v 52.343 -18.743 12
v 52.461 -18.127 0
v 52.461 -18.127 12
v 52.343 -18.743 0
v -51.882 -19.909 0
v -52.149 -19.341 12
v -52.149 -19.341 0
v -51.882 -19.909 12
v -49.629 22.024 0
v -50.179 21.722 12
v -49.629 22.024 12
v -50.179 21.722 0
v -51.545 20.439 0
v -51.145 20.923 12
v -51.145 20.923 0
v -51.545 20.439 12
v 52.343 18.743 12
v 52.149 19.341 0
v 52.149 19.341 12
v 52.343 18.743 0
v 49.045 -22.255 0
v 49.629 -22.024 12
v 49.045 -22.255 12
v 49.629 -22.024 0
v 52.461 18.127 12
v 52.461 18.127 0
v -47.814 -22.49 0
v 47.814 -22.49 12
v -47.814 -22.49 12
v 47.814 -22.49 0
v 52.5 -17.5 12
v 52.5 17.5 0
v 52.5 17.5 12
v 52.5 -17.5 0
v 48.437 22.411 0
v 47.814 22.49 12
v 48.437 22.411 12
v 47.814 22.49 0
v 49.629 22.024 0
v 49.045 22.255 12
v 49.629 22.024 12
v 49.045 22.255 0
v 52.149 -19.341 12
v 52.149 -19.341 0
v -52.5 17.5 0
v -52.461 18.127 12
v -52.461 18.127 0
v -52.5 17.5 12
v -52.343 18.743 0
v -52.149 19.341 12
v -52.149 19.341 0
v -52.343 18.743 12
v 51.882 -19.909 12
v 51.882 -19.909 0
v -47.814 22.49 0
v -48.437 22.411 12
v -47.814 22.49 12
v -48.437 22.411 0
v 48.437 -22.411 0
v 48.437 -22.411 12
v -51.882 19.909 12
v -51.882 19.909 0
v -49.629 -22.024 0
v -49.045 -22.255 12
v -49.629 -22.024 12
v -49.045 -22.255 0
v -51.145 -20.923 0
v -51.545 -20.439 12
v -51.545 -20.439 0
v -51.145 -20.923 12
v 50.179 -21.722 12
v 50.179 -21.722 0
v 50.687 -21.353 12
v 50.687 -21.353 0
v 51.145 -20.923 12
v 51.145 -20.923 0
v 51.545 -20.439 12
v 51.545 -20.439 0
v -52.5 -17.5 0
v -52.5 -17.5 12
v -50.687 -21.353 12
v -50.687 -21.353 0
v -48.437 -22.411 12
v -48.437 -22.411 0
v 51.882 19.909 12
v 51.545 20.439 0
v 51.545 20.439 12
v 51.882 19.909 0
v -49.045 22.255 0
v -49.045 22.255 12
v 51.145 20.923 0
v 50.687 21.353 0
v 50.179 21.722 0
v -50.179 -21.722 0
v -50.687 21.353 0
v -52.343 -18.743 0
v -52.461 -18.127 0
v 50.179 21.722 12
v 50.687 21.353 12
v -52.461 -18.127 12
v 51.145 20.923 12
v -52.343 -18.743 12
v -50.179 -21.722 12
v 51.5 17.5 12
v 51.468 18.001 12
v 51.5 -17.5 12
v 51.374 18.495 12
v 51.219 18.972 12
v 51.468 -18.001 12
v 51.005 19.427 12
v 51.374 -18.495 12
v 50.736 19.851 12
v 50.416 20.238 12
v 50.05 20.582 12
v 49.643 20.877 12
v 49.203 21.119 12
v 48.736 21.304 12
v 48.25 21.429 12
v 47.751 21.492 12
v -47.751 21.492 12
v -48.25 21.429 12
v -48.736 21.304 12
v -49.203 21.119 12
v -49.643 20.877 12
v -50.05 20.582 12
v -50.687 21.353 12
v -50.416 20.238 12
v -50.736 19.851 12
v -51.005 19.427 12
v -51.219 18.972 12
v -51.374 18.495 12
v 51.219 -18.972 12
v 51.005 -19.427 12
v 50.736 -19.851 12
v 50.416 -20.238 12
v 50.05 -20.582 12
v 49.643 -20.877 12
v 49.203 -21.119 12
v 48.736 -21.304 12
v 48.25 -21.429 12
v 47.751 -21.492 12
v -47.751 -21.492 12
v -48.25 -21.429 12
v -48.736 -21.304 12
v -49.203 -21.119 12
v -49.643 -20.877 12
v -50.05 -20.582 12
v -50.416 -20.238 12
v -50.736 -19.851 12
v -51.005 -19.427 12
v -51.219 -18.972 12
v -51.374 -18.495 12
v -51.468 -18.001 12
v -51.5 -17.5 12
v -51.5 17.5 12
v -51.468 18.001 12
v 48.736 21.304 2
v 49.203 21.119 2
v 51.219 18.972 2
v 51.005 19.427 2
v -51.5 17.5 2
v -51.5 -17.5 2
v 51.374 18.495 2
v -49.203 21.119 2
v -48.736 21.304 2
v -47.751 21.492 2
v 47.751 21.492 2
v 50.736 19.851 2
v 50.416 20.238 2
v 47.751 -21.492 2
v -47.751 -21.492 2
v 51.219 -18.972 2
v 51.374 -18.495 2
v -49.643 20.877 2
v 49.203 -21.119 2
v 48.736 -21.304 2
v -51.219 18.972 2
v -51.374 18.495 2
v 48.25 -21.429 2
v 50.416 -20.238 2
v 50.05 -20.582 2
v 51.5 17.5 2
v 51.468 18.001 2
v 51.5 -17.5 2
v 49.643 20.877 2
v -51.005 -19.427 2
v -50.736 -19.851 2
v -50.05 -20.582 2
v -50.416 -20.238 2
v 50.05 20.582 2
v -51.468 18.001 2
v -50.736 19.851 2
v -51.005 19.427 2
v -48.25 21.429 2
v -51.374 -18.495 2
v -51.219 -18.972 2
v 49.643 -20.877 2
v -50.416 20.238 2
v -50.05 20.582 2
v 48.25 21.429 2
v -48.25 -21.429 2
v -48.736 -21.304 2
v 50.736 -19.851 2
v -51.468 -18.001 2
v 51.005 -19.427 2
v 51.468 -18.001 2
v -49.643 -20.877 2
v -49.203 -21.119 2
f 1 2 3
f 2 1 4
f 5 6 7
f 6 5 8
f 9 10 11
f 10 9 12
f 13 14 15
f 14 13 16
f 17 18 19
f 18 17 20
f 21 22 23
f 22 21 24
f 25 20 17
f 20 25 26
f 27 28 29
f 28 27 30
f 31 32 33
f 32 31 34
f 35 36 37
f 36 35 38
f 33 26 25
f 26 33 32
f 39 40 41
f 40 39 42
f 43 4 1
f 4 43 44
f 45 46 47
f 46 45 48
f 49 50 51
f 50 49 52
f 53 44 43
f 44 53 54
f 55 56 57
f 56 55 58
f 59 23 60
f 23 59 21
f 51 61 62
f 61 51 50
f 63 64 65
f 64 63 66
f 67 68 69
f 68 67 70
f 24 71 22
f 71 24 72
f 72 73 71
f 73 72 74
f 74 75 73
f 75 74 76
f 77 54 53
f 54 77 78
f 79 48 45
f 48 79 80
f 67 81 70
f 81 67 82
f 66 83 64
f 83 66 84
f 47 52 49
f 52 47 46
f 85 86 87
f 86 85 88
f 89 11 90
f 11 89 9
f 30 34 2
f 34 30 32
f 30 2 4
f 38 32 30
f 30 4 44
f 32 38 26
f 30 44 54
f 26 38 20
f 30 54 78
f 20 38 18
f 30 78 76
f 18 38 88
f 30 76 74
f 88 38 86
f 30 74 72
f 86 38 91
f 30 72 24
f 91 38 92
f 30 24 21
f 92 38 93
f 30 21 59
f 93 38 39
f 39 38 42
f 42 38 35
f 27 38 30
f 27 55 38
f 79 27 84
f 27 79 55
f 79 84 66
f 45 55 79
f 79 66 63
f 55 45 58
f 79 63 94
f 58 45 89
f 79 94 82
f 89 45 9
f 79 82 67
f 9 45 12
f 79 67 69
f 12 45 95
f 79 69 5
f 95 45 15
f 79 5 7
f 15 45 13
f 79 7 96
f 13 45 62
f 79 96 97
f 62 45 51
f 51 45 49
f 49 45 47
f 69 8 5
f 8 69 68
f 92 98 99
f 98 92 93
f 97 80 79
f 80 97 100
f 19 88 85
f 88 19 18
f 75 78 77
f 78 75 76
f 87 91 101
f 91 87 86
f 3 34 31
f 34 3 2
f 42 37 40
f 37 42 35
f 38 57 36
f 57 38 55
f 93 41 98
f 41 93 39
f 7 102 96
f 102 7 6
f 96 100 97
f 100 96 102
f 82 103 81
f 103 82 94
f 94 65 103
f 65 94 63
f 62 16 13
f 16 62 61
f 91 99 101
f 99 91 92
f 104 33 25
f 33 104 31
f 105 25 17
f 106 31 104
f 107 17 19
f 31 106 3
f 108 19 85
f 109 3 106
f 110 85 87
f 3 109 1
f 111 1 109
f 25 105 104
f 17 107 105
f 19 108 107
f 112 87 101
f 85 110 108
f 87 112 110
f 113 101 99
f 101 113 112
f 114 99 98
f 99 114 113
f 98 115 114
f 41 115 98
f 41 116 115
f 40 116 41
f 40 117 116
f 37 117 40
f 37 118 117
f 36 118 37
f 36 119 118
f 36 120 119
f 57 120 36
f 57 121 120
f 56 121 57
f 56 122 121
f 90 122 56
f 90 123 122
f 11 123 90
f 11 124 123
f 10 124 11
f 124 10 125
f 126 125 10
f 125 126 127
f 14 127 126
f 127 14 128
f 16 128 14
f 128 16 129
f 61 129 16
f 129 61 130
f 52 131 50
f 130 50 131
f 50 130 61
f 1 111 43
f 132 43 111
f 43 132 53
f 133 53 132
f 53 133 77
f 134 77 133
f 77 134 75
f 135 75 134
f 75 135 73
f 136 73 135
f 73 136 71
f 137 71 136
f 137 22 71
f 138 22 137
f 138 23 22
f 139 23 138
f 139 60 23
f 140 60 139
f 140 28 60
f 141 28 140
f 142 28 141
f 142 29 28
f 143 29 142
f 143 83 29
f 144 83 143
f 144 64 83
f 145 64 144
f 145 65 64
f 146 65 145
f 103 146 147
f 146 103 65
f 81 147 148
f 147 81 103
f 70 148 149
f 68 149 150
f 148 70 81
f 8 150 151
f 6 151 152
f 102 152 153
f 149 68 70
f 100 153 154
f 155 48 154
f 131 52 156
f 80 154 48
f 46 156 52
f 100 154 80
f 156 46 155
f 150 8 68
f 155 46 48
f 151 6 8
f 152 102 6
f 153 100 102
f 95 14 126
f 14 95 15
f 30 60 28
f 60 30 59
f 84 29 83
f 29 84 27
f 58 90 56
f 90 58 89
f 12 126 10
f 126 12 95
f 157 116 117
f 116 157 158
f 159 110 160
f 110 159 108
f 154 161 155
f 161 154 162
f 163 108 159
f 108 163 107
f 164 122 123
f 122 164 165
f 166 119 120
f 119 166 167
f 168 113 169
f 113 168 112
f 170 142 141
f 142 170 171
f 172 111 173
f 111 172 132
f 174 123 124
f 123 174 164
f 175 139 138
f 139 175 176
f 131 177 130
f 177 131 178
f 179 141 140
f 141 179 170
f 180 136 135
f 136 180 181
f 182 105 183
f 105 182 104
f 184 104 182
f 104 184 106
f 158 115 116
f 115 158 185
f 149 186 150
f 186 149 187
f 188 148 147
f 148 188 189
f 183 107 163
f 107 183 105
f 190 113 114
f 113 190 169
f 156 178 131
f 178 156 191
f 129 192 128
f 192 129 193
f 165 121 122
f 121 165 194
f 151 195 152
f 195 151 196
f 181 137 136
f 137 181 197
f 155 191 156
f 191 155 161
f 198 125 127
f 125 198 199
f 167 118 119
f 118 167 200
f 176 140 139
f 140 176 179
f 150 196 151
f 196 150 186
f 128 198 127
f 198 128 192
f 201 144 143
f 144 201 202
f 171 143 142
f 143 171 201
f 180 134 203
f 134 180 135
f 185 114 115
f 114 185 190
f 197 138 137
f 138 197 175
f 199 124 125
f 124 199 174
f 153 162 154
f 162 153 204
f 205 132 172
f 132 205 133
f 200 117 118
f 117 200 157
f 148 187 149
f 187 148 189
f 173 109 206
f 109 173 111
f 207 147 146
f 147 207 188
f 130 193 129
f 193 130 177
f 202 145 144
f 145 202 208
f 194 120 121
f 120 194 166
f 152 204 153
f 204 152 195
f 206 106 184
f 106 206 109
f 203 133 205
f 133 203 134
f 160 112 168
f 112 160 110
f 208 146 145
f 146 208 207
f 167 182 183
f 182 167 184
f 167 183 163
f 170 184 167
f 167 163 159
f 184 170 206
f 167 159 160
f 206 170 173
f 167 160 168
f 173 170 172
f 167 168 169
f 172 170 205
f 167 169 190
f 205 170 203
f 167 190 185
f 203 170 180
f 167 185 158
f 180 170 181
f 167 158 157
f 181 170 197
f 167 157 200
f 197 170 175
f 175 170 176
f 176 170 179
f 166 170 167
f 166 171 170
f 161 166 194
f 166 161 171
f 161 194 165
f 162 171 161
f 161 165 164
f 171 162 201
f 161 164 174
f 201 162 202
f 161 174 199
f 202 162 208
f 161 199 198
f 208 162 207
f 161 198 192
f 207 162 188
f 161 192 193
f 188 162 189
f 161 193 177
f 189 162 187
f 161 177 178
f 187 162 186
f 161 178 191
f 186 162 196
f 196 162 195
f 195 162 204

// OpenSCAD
$fn = 50;


difference() {
	union() {
		hull() {
			translate(v = [-47.5000000000, 17.5000000000, 0]) {
				cylinder(h = 12, r = 5);
			}
			translate(v = [47.5000000000, 17.5000000000, 0]) {
				cylinder(h = 12, r = 5);
			}
			translate(v = [-47.5000000000, -17.5000000000, 0]) {
				cylinder(h = 12, r = 5);
			}
			translate(v = [47.5000000000, -17.5000000000, 0]) {
				cylinder(h = 12, r = 5);
			}
		}
	}
	union() {
		translate(v = [0, 0, 2]) {
			hull() {
				translate(v = [-47.5000000000, 17.5000000000, 0]) {
					cylinder(h = 10, r = 4);
				}
				translate(v = [47.5000000000, 17.5000000000, 0]) {
					cylinder(h = 10, r = 4);
				}
				translate(v = [-47.5000000000, -17.5000000000, 0]) {
					cylinder(h = 10, r = 4);
				}
				translate(v = [47.5000000000, -17.5000000000, 0]) {
					cylinder(h = 10, r = 4);
				}
			}
		}
	}
}
